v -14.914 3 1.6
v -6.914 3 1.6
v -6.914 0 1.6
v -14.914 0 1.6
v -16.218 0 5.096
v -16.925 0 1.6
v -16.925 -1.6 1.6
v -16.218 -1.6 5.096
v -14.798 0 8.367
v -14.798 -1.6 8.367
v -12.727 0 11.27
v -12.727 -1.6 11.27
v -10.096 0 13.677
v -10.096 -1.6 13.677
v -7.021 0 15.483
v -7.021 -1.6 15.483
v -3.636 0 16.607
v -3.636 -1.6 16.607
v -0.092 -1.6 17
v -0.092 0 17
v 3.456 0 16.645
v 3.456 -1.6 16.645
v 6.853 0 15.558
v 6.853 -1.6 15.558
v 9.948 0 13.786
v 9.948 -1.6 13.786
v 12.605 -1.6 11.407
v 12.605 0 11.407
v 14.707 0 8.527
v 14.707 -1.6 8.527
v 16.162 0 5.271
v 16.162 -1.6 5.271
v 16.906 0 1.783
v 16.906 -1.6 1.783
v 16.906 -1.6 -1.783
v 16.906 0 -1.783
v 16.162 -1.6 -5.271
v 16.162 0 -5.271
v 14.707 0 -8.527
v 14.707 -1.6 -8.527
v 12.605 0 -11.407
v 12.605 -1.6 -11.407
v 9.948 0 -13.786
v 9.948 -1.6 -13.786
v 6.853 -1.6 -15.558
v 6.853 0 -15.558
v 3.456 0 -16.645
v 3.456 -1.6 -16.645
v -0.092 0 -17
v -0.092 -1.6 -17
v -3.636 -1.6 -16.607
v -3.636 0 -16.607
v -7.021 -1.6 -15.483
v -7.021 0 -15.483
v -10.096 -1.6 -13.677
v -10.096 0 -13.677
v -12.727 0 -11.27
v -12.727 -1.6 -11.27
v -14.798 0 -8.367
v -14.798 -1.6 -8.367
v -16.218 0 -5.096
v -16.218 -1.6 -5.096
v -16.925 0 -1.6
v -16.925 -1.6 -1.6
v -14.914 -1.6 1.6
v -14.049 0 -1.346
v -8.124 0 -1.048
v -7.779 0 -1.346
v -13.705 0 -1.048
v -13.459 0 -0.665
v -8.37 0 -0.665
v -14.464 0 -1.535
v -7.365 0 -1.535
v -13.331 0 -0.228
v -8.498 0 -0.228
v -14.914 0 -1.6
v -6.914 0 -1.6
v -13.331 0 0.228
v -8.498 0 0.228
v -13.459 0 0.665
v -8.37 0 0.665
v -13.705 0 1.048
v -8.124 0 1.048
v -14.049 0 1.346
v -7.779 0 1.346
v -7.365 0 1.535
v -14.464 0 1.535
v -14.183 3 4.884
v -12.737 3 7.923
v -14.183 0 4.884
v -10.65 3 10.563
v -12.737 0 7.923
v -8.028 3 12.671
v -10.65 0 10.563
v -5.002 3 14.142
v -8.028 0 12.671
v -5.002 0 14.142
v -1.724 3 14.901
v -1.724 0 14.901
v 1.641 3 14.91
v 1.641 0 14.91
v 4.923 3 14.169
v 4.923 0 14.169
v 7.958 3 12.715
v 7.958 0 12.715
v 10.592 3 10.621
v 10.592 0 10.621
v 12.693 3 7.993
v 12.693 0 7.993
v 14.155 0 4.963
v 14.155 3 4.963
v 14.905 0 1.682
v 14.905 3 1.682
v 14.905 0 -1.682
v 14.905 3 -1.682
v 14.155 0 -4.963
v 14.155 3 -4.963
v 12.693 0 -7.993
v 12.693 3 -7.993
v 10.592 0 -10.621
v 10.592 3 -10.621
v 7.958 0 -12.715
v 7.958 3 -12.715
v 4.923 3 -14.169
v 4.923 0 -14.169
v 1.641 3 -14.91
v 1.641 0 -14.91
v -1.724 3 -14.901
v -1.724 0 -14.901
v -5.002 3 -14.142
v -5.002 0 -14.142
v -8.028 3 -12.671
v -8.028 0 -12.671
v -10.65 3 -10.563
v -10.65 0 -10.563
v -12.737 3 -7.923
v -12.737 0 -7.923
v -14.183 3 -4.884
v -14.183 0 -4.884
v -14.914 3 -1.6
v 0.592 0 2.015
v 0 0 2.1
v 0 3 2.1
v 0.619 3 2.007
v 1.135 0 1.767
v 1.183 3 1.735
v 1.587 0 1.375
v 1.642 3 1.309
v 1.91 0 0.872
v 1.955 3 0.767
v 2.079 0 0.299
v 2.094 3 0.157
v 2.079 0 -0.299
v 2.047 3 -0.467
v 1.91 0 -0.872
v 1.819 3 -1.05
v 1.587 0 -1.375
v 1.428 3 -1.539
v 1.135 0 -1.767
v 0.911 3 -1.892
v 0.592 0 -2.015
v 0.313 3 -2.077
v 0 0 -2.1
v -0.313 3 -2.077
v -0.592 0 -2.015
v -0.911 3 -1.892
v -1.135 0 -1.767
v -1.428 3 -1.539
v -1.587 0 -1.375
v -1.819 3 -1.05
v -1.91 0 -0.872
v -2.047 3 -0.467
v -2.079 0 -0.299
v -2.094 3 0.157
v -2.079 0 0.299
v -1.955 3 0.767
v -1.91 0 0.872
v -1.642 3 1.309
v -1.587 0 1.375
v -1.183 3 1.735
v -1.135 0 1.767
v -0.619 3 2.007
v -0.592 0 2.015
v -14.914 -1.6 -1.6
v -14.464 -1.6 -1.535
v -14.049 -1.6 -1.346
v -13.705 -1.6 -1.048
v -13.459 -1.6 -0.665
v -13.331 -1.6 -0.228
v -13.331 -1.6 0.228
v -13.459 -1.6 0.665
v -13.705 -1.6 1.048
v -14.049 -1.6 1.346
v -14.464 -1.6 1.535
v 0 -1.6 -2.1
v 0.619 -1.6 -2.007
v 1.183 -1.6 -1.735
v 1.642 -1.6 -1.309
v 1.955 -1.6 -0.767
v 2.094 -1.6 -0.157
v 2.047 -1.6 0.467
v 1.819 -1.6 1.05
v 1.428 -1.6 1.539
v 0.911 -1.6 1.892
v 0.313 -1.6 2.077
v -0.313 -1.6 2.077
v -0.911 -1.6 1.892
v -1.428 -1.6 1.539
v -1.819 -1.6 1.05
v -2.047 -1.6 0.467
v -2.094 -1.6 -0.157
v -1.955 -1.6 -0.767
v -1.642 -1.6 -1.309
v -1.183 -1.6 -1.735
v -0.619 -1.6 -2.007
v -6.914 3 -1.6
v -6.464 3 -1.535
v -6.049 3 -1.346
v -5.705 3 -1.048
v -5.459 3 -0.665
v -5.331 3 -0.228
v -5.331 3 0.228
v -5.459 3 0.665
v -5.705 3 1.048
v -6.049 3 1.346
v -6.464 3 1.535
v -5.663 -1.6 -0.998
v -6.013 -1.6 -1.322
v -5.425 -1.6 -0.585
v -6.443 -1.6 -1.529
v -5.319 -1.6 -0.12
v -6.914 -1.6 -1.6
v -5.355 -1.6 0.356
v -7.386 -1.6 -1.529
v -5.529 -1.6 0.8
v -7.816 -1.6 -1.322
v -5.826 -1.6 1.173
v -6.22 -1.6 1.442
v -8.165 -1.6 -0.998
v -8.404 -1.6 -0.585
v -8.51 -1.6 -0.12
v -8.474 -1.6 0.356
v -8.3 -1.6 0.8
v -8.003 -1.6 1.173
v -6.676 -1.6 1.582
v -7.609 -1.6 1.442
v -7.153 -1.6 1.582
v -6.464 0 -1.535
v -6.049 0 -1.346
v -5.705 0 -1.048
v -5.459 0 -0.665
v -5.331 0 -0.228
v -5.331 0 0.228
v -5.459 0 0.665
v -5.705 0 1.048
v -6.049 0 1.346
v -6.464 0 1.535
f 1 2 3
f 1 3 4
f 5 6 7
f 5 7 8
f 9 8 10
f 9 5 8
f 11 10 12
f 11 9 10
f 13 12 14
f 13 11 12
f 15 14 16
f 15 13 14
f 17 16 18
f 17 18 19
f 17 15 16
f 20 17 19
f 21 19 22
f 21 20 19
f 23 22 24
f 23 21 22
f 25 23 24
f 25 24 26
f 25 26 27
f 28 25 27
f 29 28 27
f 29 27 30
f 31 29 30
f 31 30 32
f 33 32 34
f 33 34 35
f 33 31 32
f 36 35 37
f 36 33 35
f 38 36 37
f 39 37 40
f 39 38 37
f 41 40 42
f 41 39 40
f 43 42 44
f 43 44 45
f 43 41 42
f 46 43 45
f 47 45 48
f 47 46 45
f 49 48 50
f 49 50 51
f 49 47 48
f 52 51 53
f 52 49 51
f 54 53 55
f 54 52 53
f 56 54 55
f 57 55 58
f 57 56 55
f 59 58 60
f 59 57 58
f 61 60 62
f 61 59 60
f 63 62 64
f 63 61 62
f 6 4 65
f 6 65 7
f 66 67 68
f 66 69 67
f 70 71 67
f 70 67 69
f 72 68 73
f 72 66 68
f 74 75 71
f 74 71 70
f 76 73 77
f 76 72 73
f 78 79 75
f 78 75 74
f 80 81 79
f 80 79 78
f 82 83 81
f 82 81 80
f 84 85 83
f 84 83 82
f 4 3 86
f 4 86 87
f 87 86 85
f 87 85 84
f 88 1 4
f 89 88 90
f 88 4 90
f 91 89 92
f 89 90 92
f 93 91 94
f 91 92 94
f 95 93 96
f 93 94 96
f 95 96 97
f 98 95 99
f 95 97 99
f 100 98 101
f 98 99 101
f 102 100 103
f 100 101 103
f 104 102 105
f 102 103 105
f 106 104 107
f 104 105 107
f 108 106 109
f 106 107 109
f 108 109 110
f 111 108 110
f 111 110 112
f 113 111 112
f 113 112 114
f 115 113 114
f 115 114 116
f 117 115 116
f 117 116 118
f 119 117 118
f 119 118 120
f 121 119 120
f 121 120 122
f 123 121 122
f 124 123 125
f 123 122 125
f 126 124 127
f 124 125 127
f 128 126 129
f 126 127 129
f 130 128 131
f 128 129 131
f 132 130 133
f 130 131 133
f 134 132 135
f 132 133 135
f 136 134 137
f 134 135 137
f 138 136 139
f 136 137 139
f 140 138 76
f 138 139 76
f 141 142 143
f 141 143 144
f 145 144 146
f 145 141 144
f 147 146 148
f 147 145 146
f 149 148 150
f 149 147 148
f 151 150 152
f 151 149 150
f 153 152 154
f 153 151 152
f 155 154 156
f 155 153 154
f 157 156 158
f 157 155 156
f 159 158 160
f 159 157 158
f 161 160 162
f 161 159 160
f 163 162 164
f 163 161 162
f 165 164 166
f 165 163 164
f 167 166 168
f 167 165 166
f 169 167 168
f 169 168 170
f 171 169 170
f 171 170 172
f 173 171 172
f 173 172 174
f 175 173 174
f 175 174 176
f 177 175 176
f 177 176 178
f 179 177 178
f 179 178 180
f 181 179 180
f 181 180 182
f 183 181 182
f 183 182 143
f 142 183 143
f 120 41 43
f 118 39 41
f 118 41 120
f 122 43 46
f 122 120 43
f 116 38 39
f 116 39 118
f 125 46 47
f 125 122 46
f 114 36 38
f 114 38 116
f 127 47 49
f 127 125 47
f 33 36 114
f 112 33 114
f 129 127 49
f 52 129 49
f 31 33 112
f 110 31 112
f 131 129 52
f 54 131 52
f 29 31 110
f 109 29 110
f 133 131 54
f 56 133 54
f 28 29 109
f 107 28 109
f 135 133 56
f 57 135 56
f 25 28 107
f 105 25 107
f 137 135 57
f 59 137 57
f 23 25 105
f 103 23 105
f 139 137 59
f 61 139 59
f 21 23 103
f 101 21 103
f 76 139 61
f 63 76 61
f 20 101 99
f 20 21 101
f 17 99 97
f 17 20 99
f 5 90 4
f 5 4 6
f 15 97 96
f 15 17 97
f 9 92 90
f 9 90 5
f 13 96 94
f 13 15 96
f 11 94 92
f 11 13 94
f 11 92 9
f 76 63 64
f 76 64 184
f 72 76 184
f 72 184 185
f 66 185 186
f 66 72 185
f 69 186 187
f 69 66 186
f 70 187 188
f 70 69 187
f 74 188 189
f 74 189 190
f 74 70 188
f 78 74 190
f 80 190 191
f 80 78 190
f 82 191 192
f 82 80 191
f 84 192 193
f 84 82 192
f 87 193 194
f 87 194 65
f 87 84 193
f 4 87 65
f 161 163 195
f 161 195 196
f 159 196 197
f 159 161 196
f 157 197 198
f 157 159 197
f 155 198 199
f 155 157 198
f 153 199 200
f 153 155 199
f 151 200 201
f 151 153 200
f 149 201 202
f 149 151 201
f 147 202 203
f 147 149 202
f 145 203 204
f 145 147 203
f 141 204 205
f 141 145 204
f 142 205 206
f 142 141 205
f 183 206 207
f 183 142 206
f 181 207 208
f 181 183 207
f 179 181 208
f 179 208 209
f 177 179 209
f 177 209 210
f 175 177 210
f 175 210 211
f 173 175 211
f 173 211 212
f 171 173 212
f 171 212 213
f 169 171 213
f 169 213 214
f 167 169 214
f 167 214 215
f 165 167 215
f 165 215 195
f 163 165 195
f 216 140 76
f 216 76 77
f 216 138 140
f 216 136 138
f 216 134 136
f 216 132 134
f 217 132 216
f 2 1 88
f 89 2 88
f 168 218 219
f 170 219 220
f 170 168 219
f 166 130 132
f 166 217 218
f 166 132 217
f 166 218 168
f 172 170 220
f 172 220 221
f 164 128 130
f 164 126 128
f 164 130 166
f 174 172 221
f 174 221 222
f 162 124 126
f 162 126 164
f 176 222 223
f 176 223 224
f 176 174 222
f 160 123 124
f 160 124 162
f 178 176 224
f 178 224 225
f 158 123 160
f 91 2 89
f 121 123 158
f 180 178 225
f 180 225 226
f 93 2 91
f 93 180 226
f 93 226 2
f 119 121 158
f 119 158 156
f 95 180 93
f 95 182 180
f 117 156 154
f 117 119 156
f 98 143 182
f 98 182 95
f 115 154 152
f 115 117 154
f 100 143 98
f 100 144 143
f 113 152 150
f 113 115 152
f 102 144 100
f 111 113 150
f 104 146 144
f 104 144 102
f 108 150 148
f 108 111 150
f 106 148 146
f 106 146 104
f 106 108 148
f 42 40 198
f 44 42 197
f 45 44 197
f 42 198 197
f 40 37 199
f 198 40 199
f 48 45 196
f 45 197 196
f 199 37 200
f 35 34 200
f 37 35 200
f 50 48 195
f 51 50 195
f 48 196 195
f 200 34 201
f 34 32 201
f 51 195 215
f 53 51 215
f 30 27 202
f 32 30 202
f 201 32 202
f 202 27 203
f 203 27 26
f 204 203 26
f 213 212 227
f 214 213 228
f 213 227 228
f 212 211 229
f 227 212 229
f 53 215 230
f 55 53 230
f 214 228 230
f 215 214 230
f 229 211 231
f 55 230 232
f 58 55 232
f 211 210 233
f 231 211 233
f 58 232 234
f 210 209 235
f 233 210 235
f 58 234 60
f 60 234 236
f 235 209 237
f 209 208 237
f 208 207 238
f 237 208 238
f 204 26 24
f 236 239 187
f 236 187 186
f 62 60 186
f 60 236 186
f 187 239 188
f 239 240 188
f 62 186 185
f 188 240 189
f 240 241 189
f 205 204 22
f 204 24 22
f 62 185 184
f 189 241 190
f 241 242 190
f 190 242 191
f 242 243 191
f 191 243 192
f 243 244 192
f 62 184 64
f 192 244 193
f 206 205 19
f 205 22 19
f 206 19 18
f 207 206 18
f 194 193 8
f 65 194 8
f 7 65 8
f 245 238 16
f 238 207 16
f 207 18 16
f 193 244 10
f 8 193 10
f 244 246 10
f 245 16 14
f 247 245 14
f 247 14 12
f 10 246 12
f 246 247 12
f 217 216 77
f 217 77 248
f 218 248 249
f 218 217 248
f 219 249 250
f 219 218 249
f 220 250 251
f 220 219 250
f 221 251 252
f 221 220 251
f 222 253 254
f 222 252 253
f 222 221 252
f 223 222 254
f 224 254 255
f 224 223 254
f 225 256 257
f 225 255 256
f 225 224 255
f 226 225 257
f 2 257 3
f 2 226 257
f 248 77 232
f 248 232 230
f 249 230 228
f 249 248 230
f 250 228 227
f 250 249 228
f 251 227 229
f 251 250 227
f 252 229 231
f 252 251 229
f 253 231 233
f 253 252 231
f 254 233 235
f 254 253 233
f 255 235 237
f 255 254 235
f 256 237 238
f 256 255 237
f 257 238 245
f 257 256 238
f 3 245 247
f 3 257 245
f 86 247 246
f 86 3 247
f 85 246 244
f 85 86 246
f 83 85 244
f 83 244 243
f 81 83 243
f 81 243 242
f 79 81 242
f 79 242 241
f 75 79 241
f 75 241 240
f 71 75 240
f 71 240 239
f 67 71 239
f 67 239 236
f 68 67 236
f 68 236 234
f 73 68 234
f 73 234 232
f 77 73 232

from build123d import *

# Parameters (mm, degrees)
SKETCH_1_R          = 15
SKETCH_1_R_2        = 2.1
EXTRUDE_1_DEPTH     = 3
CUT_EXTRUDE_1_DEPTH = 10
SKETCH_3_R          = 1.6
SKETCH_3_R_2        = 2.1
EXTRUDE_2_DEPTH     = 1.6


with BuildPart() as part:
    # ｽｹｯﾁ1 → ﾎﾞｽ - 押し出し1 (new body)
    with BuildSketch(Plane(origin=(0, 0, 0), x_dir=(1, 0, 0), z_dir=(0, 1, 0))):
        with Locations(Location((0, 0, 0), (0, 0, 270))):
            Circle(SKETCH_1_R)
        with Locations(Location((0, 0, 0), (0, 0, 270))):
            Circle(SKETCH_1_R_2, mode=Mode.SUBTRACT)
    extrude(amount=EXTRUDE_1_DEPTH)

    # ｽｹｯﾁ2 → ｶｯﾄ - 押し出し1 (cut)
    with BuildSketch(Plane(origin=(0, 3, 0), x_dir=(1, 0, 0), z_dir=(0, 1, 0))):
        with BuildLine():
            Line((-14.91442255, 1.6), (-6.91442255, 1.6))
            ThreePointArc((-6.91442255, 1.6), (-5.31442255, 0), (-6.91442255, -1.6))
            Line((-6.91442255, -1.6), (-14.91442255, -1.6))
            ThreePointArc((-14.91442255, -1.6), (-16.51442255, 0), (-14.91442255, 1.6))
        make_face()
    extrude(amount=-CUT_EXTRUDE_1_DEPTH, mode=Mode.SUBTRACT)

    # ｽｹｯﾁ3 → ﾎﾞｽ - 押し出し2 (add)
    with BuildSketch(Plane.XZ):
        with BuildLine():
            Line((-16.924538398, -1.6), (-14.91442255, -1.6))
            ThreePointArc((-14.91442255, -1.6), (-13.31442255, 0), (-14.91442255, 1.6))
            Line((-14.91442255, 1.6), (-16.924538398, 1.6))
            ThreePointArc((-16.924538398, 1.6), (17, 0), (-16.924538398, -1.6))
        make_face()
        with Locations(Location((-6.91442255, 0, 0), (0, 0, 270))):
            Circle(SKETCH_3_R, mode=Mode.SUBTRACT)
        with Locations(Location((0, 0, 0), (0, 0, 270))):
            Circle(SKETCH_3_R_2, mode=Mode.SUBTRACT)
    extrude(amount=EXTRUDE_2_DEPTH)


solid = part.part
